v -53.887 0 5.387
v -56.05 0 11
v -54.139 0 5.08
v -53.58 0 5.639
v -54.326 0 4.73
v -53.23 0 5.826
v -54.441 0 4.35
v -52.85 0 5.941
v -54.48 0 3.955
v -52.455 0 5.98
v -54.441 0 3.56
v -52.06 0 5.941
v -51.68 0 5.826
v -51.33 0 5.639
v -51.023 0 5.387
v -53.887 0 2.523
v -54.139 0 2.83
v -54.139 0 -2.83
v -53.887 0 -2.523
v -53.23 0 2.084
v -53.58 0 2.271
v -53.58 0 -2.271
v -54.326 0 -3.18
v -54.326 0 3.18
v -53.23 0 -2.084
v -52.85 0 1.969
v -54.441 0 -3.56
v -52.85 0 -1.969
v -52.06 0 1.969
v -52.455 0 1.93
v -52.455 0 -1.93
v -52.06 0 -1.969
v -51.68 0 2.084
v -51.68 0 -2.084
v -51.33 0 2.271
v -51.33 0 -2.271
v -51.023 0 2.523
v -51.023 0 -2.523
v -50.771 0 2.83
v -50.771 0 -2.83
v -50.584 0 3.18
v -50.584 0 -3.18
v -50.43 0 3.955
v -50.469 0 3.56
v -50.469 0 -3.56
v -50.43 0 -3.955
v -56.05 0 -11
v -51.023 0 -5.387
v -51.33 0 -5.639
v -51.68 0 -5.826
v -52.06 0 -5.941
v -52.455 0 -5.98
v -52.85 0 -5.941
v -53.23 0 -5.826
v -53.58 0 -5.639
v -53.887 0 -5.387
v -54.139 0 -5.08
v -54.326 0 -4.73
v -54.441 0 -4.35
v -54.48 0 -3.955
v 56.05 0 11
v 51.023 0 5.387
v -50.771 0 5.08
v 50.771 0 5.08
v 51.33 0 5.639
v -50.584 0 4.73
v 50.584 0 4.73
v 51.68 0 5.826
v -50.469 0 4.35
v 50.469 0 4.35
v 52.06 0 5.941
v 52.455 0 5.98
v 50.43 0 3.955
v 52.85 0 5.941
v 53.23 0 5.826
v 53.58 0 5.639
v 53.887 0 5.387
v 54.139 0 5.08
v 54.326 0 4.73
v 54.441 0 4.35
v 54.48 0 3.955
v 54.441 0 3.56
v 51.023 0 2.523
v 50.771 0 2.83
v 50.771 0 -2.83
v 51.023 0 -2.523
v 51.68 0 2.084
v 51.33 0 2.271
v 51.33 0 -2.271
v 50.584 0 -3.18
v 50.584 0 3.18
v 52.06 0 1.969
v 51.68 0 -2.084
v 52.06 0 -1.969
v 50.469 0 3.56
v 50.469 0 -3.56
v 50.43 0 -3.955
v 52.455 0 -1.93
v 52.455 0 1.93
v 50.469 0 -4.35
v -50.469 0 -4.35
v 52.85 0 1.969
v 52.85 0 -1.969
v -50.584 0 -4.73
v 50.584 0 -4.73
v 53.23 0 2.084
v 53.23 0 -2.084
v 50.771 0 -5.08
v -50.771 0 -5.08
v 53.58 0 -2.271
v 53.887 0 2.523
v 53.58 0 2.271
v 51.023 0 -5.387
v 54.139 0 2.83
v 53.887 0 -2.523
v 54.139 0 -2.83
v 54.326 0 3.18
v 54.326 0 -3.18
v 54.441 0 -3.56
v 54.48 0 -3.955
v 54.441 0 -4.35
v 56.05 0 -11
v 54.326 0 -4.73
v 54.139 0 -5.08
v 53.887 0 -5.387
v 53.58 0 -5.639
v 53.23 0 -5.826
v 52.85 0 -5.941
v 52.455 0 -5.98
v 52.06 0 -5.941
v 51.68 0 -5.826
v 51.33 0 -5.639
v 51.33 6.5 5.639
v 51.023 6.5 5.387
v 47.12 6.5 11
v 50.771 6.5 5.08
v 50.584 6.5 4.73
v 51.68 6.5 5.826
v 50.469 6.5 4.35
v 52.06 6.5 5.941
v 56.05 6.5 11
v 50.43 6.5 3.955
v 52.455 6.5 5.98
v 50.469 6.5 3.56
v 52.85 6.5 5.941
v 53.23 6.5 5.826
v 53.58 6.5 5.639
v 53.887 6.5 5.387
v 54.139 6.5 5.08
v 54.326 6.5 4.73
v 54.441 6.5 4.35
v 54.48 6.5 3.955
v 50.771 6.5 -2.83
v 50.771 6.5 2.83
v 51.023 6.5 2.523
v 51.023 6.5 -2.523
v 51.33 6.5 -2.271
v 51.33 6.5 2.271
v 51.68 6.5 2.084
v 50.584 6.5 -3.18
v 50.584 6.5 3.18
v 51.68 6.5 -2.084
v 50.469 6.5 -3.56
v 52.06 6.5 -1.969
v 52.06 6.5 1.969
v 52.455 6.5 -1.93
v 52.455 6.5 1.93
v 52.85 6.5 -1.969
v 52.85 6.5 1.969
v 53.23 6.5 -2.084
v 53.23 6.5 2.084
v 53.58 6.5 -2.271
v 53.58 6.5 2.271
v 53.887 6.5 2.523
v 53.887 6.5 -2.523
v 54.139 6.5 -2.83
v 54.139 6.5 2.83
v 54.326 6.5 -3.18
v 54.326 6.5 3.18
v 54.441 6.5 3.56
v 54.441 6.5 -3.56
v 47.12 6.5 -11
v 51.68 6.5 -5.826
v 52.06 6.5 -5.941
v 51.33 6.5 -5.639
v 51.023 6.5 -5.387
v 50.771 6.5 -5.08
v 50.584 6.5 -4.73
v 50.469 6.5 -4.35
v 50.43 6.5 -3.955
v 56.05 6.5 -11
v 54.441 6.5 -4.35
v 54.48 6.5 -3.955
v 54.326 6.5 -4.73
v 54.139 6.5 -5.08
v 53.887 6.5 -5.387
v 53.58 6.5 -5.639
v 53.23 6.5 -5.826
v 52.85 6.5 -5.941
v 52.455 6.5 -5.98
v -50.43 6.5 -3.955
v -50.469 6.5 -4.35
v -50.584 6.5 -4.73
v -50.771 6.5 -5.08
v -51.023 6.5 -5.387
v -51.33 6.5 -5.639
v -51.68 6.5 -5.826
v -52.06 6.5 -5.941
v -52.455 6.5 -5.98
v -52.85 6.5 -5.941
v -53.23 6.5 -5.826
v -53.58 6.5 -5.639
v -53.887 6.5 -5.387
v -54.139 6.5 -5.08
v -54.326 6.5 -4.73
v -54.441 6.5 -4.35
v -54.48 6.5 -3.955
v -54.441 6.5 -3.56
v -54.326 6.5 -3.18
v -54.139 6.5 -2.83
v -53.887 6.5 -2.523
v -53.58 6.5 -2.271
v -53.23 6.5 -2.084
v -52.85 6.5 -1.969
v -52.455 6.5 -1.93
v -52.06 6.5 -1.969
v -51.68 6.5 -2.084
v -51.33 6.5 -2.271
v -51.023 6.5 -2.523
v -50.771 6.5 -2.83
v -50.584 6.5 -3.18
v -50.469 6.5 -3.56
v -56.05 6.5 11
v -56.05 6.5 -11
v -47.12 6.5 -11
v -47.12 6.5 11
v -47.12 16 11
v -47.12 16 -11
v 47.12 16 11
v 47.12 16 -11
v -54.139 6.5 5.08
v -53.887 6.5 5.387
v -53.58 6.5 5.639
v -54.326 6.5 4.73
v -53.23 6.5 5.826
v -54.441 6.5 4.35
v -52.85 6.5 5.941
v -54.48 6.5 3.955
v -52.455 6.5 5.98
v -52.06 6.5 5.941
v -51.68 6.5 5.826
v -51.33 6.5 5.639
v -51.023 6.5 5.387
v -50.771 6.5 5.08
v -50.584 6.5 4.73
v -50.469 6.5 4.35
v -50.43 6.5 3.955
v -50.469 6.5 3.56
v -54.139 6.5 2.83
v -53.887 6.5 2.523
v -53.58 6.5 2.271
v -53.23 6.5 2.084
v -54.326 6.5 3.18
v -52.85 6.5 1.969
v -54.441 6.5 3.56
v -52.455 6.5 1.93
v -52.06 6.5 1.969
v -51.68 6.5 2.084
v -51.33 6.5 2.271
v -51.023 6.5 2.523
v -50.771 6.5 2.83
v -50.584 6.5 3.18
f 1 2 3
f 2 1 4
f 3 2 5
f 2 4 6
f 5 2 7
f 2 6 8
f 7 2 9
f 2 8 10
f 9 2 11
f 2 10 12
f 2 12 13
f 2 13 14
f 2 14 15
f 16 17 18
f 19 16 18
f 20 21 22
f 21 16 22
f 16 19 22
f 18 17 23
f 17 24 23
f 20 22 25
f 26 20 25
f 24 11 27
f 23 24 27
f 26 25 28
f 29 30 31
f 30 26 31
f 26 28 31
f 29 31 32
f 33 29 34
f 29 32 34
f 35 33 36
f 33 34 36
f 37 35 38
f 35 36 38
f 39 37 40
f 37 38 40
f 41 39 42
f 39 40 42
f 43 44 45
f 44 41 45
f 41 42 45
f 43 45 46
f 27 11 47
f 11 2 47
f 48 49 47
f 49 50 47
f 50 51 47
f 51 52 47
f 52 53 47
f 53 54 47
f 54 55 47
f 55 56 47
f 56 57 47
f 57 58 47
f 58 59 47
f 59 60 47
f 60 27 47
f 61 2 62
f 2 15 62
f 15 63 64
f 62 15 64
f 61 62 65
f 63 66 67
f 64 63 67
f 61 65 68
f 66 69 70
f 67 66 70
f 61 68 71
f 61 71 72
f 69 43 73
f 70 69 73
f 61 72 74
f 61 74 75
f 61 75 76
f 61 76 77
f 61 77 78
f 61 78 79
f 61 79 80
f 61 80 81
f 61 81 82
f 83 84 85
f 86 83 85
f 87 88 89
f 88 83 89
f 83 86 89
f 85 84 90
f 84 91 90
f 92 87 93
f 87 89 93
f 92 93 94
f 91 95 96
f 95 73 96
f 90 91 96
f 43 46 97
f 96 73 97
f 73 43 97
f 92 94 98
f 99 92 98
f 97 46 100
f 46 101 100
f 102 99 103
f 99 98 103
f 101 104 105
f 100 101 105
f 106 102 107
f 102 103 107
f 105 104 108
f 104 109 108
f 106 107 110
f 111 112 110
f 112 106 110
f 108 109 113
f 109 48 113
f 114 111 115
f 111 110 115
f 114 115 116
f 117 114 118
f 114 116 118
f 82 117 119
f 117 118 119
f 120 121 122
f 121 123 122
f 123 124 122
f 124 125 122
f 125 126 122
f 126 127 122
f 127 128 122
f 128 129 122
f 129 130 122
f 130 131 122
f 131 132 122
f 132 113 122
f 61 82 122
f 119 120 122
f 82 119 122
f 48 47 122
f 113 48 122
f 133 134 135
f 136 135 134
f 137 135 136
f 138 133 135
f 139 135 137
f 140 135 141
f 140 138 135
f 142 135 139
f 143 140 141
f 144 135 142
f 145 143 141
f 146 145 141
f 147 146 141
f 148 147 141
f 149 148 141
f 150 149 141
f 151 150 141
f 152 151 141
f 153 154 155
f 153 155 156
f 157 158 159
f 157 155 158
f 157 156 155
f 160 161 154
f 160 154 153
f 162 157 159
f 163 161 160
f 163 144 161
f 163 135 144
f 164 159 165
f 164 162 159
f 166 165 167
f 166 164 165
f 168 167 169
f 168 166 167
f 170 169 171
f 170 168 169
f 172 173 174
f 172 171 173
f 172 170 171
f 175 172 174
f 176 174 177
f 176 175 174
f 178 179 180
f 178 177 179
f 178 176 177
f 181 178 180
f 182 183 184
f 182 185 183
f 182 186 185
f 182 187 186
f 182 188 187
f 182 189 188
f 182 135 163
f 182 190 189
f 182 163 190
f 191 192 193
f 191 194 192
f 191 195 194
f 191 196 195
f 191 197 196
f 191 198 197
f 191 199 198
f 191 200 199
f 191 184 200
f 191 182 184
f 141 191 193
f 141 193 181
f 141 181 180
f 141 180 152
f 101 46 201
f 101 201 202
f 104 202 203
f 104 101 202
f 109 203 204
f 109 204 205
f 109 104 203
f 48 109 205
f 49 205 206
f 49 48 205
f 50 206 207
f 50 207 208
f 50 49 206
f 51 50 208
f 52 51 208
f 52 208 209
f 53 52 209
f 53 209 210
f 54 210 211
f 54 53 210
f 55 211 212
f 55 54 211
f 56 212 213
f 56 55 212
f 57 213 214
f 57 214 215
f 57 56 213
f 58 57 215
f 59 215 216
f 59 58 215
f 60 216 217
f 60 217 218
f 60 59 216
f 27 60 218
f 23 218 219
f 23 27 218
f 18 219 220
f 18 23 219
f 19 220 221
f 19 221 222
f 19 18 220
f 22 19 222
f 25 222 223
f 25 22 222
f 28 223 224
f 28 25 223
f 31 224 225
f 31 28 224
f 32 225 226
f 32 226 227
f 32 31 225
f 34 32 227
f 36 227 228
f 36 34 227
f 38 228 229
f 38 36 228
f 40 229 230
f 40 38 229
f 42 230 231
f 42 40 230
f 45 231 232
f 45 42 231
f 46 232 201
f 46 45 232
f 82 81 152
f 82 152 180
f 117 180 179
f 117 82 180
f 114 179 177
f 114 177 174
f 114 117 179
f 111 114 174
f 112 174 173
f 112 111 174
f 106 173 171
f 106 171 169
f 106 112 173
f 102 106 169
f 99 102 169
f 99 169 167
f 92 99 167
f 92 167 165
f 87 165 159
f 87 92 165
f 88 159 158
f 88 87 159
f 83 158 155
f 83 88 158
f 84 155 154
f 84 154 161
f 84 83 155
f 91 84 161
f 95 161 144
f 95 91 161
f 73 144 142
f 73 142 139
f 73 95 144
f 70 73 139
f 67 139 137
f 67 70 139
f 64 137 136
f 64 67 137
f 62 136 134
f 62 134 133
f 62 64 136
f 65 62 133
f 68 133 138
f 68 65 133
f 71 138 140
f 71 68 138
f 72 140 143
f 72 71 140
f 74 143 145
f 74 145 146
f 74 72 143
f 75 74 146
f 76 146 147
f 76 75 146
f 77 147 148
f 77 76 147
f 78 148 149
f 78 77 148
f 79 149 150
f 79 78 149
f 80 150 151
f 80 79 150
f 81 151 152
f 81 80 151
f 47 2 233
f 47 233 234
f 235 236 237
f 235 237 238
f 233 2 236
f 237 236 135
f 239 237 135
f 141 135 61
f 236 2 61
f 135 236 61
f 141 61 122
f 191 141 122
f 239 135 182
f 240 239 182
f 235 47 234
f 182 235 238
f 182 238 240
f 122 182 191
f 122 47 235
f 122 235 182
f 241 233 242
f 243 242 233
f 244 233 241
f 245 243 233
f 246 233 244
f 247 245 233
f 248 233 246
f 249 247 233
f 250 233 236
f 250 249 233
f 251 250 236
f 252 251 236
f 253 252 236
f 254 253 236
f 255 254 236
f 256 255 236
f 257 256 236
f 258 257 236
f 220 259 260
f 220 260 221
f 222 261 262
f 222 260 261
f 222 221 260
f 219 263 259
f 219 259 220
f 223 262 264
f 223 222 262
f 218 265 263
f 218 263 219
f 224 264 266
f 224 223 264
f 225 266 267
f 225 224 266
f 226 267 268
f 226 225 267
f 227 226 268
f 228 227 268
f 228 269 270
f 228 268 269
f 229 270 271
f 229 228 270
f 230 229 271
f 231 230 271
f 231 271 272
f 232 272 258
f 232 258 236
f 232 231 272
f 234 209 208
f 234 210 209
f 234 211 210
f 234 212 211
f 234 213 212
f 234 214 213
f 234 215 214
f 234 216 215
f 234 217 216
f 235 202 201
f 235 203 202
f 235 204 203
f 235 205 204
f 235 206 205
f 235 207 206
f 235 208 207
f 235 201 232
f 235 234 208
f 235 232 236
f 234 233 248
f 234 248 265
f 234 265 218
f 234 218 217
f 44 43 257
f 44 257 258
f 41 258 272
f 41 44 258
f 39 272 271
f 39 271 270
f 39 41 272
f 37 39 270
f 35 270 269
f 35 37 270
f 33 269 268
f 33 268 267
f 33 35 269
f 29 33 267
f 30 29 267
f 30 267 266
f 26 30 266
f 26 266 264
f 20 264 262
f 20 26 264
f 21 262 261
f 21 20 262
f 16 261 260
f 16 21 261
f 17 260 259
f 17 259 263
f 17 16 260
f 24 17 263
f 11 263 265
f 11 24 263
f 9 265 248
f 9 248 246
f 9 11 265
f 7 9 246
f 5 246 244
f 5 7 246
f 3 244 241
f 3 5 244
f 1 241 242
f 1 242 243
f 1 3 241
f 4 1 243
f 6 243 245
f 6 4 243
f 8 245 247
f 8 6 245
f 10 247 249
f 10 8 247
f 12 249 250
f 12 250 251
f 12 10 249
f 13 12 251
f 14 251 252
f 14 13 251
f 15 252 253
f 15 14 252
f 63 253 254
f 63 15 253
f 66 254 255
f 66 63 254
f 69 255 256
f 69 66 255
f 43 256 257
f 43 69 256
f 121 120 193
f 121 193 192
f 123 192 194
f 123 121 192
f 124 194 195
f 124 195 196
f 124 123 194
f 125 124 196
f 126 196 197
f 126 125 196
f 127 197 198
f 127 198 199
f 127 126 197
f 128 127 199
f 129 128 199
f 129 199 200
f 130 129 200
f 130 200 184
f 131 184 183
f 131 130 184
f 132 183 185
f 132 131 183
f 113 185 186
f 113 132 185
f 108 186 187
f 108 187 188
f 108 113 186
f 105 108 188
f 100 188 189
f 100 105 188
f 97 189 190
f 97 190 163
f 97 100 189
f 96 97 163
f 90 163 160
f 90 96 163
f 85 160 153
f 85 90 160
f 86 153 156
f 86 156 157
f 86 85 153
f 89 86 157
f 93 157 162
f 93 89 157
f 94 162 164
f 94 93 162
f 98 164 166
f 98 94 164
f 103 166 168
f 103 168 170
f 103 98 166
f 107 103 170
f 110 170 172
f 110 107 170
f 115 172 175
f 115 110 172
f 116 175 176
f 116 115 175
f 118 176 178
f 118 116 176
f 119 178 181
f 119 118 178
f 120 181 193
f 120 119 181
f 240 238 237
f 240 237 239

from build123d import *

# Parameters (mm, degrees)
SKETCH1_W           = 112.1
SKETCH1_H           = 22
SKETCH1_R           = 2.025
BOSS_EXTRUDE1_DEPTH = 6.5
SKETCH2_W           = 94.239862036
SKETCH2_H           = 22
BOSS_EXTRUDE3_DEPTH = 9.5


with BuildPart() as part:
    # Sketch1 → Boss-Extrude1 (new body)
    with BuildSketch(Plane(origin=(0, 0, 0), x_dir=(1, 0, 0), z_dir=(0, 1, 0))):
        Rectangle(SKETCH1_W, SKETCH1_H)
        with Locations((-52.455, 3.955)):
            Circle(SKETCH1_R, mode=Mode.SUBTRACT)
        with Locations((-52.455, -3.955)):
            Circle(SKETCH1_R, mode=Mode.SUBTRACT)
        with Locations((52.455, -3.955)):
            Circle(SKETCH1_R, mode=Mode.SUBTRACT)
        with Locations((52.455, 3.955)):
            Circle(SKETCH1_R, mode=Mode.SUBTRACT)
    extrude(amount=BOSS_EXTRUDE1_DEPTH)

    # Sketch2 → Boss-Extrude3 (add)
    with BuildSketch(Plane(origin=(0, 6.5, 0), x_dir=(1, 0, 0), z_dir=(0, 1, 0))):
        Rectangle(SKETCH2_W, SKETCH2_H)
    extrude(amount=BOSS_EXTRUDE3_DEPTH)


solid = part.part
